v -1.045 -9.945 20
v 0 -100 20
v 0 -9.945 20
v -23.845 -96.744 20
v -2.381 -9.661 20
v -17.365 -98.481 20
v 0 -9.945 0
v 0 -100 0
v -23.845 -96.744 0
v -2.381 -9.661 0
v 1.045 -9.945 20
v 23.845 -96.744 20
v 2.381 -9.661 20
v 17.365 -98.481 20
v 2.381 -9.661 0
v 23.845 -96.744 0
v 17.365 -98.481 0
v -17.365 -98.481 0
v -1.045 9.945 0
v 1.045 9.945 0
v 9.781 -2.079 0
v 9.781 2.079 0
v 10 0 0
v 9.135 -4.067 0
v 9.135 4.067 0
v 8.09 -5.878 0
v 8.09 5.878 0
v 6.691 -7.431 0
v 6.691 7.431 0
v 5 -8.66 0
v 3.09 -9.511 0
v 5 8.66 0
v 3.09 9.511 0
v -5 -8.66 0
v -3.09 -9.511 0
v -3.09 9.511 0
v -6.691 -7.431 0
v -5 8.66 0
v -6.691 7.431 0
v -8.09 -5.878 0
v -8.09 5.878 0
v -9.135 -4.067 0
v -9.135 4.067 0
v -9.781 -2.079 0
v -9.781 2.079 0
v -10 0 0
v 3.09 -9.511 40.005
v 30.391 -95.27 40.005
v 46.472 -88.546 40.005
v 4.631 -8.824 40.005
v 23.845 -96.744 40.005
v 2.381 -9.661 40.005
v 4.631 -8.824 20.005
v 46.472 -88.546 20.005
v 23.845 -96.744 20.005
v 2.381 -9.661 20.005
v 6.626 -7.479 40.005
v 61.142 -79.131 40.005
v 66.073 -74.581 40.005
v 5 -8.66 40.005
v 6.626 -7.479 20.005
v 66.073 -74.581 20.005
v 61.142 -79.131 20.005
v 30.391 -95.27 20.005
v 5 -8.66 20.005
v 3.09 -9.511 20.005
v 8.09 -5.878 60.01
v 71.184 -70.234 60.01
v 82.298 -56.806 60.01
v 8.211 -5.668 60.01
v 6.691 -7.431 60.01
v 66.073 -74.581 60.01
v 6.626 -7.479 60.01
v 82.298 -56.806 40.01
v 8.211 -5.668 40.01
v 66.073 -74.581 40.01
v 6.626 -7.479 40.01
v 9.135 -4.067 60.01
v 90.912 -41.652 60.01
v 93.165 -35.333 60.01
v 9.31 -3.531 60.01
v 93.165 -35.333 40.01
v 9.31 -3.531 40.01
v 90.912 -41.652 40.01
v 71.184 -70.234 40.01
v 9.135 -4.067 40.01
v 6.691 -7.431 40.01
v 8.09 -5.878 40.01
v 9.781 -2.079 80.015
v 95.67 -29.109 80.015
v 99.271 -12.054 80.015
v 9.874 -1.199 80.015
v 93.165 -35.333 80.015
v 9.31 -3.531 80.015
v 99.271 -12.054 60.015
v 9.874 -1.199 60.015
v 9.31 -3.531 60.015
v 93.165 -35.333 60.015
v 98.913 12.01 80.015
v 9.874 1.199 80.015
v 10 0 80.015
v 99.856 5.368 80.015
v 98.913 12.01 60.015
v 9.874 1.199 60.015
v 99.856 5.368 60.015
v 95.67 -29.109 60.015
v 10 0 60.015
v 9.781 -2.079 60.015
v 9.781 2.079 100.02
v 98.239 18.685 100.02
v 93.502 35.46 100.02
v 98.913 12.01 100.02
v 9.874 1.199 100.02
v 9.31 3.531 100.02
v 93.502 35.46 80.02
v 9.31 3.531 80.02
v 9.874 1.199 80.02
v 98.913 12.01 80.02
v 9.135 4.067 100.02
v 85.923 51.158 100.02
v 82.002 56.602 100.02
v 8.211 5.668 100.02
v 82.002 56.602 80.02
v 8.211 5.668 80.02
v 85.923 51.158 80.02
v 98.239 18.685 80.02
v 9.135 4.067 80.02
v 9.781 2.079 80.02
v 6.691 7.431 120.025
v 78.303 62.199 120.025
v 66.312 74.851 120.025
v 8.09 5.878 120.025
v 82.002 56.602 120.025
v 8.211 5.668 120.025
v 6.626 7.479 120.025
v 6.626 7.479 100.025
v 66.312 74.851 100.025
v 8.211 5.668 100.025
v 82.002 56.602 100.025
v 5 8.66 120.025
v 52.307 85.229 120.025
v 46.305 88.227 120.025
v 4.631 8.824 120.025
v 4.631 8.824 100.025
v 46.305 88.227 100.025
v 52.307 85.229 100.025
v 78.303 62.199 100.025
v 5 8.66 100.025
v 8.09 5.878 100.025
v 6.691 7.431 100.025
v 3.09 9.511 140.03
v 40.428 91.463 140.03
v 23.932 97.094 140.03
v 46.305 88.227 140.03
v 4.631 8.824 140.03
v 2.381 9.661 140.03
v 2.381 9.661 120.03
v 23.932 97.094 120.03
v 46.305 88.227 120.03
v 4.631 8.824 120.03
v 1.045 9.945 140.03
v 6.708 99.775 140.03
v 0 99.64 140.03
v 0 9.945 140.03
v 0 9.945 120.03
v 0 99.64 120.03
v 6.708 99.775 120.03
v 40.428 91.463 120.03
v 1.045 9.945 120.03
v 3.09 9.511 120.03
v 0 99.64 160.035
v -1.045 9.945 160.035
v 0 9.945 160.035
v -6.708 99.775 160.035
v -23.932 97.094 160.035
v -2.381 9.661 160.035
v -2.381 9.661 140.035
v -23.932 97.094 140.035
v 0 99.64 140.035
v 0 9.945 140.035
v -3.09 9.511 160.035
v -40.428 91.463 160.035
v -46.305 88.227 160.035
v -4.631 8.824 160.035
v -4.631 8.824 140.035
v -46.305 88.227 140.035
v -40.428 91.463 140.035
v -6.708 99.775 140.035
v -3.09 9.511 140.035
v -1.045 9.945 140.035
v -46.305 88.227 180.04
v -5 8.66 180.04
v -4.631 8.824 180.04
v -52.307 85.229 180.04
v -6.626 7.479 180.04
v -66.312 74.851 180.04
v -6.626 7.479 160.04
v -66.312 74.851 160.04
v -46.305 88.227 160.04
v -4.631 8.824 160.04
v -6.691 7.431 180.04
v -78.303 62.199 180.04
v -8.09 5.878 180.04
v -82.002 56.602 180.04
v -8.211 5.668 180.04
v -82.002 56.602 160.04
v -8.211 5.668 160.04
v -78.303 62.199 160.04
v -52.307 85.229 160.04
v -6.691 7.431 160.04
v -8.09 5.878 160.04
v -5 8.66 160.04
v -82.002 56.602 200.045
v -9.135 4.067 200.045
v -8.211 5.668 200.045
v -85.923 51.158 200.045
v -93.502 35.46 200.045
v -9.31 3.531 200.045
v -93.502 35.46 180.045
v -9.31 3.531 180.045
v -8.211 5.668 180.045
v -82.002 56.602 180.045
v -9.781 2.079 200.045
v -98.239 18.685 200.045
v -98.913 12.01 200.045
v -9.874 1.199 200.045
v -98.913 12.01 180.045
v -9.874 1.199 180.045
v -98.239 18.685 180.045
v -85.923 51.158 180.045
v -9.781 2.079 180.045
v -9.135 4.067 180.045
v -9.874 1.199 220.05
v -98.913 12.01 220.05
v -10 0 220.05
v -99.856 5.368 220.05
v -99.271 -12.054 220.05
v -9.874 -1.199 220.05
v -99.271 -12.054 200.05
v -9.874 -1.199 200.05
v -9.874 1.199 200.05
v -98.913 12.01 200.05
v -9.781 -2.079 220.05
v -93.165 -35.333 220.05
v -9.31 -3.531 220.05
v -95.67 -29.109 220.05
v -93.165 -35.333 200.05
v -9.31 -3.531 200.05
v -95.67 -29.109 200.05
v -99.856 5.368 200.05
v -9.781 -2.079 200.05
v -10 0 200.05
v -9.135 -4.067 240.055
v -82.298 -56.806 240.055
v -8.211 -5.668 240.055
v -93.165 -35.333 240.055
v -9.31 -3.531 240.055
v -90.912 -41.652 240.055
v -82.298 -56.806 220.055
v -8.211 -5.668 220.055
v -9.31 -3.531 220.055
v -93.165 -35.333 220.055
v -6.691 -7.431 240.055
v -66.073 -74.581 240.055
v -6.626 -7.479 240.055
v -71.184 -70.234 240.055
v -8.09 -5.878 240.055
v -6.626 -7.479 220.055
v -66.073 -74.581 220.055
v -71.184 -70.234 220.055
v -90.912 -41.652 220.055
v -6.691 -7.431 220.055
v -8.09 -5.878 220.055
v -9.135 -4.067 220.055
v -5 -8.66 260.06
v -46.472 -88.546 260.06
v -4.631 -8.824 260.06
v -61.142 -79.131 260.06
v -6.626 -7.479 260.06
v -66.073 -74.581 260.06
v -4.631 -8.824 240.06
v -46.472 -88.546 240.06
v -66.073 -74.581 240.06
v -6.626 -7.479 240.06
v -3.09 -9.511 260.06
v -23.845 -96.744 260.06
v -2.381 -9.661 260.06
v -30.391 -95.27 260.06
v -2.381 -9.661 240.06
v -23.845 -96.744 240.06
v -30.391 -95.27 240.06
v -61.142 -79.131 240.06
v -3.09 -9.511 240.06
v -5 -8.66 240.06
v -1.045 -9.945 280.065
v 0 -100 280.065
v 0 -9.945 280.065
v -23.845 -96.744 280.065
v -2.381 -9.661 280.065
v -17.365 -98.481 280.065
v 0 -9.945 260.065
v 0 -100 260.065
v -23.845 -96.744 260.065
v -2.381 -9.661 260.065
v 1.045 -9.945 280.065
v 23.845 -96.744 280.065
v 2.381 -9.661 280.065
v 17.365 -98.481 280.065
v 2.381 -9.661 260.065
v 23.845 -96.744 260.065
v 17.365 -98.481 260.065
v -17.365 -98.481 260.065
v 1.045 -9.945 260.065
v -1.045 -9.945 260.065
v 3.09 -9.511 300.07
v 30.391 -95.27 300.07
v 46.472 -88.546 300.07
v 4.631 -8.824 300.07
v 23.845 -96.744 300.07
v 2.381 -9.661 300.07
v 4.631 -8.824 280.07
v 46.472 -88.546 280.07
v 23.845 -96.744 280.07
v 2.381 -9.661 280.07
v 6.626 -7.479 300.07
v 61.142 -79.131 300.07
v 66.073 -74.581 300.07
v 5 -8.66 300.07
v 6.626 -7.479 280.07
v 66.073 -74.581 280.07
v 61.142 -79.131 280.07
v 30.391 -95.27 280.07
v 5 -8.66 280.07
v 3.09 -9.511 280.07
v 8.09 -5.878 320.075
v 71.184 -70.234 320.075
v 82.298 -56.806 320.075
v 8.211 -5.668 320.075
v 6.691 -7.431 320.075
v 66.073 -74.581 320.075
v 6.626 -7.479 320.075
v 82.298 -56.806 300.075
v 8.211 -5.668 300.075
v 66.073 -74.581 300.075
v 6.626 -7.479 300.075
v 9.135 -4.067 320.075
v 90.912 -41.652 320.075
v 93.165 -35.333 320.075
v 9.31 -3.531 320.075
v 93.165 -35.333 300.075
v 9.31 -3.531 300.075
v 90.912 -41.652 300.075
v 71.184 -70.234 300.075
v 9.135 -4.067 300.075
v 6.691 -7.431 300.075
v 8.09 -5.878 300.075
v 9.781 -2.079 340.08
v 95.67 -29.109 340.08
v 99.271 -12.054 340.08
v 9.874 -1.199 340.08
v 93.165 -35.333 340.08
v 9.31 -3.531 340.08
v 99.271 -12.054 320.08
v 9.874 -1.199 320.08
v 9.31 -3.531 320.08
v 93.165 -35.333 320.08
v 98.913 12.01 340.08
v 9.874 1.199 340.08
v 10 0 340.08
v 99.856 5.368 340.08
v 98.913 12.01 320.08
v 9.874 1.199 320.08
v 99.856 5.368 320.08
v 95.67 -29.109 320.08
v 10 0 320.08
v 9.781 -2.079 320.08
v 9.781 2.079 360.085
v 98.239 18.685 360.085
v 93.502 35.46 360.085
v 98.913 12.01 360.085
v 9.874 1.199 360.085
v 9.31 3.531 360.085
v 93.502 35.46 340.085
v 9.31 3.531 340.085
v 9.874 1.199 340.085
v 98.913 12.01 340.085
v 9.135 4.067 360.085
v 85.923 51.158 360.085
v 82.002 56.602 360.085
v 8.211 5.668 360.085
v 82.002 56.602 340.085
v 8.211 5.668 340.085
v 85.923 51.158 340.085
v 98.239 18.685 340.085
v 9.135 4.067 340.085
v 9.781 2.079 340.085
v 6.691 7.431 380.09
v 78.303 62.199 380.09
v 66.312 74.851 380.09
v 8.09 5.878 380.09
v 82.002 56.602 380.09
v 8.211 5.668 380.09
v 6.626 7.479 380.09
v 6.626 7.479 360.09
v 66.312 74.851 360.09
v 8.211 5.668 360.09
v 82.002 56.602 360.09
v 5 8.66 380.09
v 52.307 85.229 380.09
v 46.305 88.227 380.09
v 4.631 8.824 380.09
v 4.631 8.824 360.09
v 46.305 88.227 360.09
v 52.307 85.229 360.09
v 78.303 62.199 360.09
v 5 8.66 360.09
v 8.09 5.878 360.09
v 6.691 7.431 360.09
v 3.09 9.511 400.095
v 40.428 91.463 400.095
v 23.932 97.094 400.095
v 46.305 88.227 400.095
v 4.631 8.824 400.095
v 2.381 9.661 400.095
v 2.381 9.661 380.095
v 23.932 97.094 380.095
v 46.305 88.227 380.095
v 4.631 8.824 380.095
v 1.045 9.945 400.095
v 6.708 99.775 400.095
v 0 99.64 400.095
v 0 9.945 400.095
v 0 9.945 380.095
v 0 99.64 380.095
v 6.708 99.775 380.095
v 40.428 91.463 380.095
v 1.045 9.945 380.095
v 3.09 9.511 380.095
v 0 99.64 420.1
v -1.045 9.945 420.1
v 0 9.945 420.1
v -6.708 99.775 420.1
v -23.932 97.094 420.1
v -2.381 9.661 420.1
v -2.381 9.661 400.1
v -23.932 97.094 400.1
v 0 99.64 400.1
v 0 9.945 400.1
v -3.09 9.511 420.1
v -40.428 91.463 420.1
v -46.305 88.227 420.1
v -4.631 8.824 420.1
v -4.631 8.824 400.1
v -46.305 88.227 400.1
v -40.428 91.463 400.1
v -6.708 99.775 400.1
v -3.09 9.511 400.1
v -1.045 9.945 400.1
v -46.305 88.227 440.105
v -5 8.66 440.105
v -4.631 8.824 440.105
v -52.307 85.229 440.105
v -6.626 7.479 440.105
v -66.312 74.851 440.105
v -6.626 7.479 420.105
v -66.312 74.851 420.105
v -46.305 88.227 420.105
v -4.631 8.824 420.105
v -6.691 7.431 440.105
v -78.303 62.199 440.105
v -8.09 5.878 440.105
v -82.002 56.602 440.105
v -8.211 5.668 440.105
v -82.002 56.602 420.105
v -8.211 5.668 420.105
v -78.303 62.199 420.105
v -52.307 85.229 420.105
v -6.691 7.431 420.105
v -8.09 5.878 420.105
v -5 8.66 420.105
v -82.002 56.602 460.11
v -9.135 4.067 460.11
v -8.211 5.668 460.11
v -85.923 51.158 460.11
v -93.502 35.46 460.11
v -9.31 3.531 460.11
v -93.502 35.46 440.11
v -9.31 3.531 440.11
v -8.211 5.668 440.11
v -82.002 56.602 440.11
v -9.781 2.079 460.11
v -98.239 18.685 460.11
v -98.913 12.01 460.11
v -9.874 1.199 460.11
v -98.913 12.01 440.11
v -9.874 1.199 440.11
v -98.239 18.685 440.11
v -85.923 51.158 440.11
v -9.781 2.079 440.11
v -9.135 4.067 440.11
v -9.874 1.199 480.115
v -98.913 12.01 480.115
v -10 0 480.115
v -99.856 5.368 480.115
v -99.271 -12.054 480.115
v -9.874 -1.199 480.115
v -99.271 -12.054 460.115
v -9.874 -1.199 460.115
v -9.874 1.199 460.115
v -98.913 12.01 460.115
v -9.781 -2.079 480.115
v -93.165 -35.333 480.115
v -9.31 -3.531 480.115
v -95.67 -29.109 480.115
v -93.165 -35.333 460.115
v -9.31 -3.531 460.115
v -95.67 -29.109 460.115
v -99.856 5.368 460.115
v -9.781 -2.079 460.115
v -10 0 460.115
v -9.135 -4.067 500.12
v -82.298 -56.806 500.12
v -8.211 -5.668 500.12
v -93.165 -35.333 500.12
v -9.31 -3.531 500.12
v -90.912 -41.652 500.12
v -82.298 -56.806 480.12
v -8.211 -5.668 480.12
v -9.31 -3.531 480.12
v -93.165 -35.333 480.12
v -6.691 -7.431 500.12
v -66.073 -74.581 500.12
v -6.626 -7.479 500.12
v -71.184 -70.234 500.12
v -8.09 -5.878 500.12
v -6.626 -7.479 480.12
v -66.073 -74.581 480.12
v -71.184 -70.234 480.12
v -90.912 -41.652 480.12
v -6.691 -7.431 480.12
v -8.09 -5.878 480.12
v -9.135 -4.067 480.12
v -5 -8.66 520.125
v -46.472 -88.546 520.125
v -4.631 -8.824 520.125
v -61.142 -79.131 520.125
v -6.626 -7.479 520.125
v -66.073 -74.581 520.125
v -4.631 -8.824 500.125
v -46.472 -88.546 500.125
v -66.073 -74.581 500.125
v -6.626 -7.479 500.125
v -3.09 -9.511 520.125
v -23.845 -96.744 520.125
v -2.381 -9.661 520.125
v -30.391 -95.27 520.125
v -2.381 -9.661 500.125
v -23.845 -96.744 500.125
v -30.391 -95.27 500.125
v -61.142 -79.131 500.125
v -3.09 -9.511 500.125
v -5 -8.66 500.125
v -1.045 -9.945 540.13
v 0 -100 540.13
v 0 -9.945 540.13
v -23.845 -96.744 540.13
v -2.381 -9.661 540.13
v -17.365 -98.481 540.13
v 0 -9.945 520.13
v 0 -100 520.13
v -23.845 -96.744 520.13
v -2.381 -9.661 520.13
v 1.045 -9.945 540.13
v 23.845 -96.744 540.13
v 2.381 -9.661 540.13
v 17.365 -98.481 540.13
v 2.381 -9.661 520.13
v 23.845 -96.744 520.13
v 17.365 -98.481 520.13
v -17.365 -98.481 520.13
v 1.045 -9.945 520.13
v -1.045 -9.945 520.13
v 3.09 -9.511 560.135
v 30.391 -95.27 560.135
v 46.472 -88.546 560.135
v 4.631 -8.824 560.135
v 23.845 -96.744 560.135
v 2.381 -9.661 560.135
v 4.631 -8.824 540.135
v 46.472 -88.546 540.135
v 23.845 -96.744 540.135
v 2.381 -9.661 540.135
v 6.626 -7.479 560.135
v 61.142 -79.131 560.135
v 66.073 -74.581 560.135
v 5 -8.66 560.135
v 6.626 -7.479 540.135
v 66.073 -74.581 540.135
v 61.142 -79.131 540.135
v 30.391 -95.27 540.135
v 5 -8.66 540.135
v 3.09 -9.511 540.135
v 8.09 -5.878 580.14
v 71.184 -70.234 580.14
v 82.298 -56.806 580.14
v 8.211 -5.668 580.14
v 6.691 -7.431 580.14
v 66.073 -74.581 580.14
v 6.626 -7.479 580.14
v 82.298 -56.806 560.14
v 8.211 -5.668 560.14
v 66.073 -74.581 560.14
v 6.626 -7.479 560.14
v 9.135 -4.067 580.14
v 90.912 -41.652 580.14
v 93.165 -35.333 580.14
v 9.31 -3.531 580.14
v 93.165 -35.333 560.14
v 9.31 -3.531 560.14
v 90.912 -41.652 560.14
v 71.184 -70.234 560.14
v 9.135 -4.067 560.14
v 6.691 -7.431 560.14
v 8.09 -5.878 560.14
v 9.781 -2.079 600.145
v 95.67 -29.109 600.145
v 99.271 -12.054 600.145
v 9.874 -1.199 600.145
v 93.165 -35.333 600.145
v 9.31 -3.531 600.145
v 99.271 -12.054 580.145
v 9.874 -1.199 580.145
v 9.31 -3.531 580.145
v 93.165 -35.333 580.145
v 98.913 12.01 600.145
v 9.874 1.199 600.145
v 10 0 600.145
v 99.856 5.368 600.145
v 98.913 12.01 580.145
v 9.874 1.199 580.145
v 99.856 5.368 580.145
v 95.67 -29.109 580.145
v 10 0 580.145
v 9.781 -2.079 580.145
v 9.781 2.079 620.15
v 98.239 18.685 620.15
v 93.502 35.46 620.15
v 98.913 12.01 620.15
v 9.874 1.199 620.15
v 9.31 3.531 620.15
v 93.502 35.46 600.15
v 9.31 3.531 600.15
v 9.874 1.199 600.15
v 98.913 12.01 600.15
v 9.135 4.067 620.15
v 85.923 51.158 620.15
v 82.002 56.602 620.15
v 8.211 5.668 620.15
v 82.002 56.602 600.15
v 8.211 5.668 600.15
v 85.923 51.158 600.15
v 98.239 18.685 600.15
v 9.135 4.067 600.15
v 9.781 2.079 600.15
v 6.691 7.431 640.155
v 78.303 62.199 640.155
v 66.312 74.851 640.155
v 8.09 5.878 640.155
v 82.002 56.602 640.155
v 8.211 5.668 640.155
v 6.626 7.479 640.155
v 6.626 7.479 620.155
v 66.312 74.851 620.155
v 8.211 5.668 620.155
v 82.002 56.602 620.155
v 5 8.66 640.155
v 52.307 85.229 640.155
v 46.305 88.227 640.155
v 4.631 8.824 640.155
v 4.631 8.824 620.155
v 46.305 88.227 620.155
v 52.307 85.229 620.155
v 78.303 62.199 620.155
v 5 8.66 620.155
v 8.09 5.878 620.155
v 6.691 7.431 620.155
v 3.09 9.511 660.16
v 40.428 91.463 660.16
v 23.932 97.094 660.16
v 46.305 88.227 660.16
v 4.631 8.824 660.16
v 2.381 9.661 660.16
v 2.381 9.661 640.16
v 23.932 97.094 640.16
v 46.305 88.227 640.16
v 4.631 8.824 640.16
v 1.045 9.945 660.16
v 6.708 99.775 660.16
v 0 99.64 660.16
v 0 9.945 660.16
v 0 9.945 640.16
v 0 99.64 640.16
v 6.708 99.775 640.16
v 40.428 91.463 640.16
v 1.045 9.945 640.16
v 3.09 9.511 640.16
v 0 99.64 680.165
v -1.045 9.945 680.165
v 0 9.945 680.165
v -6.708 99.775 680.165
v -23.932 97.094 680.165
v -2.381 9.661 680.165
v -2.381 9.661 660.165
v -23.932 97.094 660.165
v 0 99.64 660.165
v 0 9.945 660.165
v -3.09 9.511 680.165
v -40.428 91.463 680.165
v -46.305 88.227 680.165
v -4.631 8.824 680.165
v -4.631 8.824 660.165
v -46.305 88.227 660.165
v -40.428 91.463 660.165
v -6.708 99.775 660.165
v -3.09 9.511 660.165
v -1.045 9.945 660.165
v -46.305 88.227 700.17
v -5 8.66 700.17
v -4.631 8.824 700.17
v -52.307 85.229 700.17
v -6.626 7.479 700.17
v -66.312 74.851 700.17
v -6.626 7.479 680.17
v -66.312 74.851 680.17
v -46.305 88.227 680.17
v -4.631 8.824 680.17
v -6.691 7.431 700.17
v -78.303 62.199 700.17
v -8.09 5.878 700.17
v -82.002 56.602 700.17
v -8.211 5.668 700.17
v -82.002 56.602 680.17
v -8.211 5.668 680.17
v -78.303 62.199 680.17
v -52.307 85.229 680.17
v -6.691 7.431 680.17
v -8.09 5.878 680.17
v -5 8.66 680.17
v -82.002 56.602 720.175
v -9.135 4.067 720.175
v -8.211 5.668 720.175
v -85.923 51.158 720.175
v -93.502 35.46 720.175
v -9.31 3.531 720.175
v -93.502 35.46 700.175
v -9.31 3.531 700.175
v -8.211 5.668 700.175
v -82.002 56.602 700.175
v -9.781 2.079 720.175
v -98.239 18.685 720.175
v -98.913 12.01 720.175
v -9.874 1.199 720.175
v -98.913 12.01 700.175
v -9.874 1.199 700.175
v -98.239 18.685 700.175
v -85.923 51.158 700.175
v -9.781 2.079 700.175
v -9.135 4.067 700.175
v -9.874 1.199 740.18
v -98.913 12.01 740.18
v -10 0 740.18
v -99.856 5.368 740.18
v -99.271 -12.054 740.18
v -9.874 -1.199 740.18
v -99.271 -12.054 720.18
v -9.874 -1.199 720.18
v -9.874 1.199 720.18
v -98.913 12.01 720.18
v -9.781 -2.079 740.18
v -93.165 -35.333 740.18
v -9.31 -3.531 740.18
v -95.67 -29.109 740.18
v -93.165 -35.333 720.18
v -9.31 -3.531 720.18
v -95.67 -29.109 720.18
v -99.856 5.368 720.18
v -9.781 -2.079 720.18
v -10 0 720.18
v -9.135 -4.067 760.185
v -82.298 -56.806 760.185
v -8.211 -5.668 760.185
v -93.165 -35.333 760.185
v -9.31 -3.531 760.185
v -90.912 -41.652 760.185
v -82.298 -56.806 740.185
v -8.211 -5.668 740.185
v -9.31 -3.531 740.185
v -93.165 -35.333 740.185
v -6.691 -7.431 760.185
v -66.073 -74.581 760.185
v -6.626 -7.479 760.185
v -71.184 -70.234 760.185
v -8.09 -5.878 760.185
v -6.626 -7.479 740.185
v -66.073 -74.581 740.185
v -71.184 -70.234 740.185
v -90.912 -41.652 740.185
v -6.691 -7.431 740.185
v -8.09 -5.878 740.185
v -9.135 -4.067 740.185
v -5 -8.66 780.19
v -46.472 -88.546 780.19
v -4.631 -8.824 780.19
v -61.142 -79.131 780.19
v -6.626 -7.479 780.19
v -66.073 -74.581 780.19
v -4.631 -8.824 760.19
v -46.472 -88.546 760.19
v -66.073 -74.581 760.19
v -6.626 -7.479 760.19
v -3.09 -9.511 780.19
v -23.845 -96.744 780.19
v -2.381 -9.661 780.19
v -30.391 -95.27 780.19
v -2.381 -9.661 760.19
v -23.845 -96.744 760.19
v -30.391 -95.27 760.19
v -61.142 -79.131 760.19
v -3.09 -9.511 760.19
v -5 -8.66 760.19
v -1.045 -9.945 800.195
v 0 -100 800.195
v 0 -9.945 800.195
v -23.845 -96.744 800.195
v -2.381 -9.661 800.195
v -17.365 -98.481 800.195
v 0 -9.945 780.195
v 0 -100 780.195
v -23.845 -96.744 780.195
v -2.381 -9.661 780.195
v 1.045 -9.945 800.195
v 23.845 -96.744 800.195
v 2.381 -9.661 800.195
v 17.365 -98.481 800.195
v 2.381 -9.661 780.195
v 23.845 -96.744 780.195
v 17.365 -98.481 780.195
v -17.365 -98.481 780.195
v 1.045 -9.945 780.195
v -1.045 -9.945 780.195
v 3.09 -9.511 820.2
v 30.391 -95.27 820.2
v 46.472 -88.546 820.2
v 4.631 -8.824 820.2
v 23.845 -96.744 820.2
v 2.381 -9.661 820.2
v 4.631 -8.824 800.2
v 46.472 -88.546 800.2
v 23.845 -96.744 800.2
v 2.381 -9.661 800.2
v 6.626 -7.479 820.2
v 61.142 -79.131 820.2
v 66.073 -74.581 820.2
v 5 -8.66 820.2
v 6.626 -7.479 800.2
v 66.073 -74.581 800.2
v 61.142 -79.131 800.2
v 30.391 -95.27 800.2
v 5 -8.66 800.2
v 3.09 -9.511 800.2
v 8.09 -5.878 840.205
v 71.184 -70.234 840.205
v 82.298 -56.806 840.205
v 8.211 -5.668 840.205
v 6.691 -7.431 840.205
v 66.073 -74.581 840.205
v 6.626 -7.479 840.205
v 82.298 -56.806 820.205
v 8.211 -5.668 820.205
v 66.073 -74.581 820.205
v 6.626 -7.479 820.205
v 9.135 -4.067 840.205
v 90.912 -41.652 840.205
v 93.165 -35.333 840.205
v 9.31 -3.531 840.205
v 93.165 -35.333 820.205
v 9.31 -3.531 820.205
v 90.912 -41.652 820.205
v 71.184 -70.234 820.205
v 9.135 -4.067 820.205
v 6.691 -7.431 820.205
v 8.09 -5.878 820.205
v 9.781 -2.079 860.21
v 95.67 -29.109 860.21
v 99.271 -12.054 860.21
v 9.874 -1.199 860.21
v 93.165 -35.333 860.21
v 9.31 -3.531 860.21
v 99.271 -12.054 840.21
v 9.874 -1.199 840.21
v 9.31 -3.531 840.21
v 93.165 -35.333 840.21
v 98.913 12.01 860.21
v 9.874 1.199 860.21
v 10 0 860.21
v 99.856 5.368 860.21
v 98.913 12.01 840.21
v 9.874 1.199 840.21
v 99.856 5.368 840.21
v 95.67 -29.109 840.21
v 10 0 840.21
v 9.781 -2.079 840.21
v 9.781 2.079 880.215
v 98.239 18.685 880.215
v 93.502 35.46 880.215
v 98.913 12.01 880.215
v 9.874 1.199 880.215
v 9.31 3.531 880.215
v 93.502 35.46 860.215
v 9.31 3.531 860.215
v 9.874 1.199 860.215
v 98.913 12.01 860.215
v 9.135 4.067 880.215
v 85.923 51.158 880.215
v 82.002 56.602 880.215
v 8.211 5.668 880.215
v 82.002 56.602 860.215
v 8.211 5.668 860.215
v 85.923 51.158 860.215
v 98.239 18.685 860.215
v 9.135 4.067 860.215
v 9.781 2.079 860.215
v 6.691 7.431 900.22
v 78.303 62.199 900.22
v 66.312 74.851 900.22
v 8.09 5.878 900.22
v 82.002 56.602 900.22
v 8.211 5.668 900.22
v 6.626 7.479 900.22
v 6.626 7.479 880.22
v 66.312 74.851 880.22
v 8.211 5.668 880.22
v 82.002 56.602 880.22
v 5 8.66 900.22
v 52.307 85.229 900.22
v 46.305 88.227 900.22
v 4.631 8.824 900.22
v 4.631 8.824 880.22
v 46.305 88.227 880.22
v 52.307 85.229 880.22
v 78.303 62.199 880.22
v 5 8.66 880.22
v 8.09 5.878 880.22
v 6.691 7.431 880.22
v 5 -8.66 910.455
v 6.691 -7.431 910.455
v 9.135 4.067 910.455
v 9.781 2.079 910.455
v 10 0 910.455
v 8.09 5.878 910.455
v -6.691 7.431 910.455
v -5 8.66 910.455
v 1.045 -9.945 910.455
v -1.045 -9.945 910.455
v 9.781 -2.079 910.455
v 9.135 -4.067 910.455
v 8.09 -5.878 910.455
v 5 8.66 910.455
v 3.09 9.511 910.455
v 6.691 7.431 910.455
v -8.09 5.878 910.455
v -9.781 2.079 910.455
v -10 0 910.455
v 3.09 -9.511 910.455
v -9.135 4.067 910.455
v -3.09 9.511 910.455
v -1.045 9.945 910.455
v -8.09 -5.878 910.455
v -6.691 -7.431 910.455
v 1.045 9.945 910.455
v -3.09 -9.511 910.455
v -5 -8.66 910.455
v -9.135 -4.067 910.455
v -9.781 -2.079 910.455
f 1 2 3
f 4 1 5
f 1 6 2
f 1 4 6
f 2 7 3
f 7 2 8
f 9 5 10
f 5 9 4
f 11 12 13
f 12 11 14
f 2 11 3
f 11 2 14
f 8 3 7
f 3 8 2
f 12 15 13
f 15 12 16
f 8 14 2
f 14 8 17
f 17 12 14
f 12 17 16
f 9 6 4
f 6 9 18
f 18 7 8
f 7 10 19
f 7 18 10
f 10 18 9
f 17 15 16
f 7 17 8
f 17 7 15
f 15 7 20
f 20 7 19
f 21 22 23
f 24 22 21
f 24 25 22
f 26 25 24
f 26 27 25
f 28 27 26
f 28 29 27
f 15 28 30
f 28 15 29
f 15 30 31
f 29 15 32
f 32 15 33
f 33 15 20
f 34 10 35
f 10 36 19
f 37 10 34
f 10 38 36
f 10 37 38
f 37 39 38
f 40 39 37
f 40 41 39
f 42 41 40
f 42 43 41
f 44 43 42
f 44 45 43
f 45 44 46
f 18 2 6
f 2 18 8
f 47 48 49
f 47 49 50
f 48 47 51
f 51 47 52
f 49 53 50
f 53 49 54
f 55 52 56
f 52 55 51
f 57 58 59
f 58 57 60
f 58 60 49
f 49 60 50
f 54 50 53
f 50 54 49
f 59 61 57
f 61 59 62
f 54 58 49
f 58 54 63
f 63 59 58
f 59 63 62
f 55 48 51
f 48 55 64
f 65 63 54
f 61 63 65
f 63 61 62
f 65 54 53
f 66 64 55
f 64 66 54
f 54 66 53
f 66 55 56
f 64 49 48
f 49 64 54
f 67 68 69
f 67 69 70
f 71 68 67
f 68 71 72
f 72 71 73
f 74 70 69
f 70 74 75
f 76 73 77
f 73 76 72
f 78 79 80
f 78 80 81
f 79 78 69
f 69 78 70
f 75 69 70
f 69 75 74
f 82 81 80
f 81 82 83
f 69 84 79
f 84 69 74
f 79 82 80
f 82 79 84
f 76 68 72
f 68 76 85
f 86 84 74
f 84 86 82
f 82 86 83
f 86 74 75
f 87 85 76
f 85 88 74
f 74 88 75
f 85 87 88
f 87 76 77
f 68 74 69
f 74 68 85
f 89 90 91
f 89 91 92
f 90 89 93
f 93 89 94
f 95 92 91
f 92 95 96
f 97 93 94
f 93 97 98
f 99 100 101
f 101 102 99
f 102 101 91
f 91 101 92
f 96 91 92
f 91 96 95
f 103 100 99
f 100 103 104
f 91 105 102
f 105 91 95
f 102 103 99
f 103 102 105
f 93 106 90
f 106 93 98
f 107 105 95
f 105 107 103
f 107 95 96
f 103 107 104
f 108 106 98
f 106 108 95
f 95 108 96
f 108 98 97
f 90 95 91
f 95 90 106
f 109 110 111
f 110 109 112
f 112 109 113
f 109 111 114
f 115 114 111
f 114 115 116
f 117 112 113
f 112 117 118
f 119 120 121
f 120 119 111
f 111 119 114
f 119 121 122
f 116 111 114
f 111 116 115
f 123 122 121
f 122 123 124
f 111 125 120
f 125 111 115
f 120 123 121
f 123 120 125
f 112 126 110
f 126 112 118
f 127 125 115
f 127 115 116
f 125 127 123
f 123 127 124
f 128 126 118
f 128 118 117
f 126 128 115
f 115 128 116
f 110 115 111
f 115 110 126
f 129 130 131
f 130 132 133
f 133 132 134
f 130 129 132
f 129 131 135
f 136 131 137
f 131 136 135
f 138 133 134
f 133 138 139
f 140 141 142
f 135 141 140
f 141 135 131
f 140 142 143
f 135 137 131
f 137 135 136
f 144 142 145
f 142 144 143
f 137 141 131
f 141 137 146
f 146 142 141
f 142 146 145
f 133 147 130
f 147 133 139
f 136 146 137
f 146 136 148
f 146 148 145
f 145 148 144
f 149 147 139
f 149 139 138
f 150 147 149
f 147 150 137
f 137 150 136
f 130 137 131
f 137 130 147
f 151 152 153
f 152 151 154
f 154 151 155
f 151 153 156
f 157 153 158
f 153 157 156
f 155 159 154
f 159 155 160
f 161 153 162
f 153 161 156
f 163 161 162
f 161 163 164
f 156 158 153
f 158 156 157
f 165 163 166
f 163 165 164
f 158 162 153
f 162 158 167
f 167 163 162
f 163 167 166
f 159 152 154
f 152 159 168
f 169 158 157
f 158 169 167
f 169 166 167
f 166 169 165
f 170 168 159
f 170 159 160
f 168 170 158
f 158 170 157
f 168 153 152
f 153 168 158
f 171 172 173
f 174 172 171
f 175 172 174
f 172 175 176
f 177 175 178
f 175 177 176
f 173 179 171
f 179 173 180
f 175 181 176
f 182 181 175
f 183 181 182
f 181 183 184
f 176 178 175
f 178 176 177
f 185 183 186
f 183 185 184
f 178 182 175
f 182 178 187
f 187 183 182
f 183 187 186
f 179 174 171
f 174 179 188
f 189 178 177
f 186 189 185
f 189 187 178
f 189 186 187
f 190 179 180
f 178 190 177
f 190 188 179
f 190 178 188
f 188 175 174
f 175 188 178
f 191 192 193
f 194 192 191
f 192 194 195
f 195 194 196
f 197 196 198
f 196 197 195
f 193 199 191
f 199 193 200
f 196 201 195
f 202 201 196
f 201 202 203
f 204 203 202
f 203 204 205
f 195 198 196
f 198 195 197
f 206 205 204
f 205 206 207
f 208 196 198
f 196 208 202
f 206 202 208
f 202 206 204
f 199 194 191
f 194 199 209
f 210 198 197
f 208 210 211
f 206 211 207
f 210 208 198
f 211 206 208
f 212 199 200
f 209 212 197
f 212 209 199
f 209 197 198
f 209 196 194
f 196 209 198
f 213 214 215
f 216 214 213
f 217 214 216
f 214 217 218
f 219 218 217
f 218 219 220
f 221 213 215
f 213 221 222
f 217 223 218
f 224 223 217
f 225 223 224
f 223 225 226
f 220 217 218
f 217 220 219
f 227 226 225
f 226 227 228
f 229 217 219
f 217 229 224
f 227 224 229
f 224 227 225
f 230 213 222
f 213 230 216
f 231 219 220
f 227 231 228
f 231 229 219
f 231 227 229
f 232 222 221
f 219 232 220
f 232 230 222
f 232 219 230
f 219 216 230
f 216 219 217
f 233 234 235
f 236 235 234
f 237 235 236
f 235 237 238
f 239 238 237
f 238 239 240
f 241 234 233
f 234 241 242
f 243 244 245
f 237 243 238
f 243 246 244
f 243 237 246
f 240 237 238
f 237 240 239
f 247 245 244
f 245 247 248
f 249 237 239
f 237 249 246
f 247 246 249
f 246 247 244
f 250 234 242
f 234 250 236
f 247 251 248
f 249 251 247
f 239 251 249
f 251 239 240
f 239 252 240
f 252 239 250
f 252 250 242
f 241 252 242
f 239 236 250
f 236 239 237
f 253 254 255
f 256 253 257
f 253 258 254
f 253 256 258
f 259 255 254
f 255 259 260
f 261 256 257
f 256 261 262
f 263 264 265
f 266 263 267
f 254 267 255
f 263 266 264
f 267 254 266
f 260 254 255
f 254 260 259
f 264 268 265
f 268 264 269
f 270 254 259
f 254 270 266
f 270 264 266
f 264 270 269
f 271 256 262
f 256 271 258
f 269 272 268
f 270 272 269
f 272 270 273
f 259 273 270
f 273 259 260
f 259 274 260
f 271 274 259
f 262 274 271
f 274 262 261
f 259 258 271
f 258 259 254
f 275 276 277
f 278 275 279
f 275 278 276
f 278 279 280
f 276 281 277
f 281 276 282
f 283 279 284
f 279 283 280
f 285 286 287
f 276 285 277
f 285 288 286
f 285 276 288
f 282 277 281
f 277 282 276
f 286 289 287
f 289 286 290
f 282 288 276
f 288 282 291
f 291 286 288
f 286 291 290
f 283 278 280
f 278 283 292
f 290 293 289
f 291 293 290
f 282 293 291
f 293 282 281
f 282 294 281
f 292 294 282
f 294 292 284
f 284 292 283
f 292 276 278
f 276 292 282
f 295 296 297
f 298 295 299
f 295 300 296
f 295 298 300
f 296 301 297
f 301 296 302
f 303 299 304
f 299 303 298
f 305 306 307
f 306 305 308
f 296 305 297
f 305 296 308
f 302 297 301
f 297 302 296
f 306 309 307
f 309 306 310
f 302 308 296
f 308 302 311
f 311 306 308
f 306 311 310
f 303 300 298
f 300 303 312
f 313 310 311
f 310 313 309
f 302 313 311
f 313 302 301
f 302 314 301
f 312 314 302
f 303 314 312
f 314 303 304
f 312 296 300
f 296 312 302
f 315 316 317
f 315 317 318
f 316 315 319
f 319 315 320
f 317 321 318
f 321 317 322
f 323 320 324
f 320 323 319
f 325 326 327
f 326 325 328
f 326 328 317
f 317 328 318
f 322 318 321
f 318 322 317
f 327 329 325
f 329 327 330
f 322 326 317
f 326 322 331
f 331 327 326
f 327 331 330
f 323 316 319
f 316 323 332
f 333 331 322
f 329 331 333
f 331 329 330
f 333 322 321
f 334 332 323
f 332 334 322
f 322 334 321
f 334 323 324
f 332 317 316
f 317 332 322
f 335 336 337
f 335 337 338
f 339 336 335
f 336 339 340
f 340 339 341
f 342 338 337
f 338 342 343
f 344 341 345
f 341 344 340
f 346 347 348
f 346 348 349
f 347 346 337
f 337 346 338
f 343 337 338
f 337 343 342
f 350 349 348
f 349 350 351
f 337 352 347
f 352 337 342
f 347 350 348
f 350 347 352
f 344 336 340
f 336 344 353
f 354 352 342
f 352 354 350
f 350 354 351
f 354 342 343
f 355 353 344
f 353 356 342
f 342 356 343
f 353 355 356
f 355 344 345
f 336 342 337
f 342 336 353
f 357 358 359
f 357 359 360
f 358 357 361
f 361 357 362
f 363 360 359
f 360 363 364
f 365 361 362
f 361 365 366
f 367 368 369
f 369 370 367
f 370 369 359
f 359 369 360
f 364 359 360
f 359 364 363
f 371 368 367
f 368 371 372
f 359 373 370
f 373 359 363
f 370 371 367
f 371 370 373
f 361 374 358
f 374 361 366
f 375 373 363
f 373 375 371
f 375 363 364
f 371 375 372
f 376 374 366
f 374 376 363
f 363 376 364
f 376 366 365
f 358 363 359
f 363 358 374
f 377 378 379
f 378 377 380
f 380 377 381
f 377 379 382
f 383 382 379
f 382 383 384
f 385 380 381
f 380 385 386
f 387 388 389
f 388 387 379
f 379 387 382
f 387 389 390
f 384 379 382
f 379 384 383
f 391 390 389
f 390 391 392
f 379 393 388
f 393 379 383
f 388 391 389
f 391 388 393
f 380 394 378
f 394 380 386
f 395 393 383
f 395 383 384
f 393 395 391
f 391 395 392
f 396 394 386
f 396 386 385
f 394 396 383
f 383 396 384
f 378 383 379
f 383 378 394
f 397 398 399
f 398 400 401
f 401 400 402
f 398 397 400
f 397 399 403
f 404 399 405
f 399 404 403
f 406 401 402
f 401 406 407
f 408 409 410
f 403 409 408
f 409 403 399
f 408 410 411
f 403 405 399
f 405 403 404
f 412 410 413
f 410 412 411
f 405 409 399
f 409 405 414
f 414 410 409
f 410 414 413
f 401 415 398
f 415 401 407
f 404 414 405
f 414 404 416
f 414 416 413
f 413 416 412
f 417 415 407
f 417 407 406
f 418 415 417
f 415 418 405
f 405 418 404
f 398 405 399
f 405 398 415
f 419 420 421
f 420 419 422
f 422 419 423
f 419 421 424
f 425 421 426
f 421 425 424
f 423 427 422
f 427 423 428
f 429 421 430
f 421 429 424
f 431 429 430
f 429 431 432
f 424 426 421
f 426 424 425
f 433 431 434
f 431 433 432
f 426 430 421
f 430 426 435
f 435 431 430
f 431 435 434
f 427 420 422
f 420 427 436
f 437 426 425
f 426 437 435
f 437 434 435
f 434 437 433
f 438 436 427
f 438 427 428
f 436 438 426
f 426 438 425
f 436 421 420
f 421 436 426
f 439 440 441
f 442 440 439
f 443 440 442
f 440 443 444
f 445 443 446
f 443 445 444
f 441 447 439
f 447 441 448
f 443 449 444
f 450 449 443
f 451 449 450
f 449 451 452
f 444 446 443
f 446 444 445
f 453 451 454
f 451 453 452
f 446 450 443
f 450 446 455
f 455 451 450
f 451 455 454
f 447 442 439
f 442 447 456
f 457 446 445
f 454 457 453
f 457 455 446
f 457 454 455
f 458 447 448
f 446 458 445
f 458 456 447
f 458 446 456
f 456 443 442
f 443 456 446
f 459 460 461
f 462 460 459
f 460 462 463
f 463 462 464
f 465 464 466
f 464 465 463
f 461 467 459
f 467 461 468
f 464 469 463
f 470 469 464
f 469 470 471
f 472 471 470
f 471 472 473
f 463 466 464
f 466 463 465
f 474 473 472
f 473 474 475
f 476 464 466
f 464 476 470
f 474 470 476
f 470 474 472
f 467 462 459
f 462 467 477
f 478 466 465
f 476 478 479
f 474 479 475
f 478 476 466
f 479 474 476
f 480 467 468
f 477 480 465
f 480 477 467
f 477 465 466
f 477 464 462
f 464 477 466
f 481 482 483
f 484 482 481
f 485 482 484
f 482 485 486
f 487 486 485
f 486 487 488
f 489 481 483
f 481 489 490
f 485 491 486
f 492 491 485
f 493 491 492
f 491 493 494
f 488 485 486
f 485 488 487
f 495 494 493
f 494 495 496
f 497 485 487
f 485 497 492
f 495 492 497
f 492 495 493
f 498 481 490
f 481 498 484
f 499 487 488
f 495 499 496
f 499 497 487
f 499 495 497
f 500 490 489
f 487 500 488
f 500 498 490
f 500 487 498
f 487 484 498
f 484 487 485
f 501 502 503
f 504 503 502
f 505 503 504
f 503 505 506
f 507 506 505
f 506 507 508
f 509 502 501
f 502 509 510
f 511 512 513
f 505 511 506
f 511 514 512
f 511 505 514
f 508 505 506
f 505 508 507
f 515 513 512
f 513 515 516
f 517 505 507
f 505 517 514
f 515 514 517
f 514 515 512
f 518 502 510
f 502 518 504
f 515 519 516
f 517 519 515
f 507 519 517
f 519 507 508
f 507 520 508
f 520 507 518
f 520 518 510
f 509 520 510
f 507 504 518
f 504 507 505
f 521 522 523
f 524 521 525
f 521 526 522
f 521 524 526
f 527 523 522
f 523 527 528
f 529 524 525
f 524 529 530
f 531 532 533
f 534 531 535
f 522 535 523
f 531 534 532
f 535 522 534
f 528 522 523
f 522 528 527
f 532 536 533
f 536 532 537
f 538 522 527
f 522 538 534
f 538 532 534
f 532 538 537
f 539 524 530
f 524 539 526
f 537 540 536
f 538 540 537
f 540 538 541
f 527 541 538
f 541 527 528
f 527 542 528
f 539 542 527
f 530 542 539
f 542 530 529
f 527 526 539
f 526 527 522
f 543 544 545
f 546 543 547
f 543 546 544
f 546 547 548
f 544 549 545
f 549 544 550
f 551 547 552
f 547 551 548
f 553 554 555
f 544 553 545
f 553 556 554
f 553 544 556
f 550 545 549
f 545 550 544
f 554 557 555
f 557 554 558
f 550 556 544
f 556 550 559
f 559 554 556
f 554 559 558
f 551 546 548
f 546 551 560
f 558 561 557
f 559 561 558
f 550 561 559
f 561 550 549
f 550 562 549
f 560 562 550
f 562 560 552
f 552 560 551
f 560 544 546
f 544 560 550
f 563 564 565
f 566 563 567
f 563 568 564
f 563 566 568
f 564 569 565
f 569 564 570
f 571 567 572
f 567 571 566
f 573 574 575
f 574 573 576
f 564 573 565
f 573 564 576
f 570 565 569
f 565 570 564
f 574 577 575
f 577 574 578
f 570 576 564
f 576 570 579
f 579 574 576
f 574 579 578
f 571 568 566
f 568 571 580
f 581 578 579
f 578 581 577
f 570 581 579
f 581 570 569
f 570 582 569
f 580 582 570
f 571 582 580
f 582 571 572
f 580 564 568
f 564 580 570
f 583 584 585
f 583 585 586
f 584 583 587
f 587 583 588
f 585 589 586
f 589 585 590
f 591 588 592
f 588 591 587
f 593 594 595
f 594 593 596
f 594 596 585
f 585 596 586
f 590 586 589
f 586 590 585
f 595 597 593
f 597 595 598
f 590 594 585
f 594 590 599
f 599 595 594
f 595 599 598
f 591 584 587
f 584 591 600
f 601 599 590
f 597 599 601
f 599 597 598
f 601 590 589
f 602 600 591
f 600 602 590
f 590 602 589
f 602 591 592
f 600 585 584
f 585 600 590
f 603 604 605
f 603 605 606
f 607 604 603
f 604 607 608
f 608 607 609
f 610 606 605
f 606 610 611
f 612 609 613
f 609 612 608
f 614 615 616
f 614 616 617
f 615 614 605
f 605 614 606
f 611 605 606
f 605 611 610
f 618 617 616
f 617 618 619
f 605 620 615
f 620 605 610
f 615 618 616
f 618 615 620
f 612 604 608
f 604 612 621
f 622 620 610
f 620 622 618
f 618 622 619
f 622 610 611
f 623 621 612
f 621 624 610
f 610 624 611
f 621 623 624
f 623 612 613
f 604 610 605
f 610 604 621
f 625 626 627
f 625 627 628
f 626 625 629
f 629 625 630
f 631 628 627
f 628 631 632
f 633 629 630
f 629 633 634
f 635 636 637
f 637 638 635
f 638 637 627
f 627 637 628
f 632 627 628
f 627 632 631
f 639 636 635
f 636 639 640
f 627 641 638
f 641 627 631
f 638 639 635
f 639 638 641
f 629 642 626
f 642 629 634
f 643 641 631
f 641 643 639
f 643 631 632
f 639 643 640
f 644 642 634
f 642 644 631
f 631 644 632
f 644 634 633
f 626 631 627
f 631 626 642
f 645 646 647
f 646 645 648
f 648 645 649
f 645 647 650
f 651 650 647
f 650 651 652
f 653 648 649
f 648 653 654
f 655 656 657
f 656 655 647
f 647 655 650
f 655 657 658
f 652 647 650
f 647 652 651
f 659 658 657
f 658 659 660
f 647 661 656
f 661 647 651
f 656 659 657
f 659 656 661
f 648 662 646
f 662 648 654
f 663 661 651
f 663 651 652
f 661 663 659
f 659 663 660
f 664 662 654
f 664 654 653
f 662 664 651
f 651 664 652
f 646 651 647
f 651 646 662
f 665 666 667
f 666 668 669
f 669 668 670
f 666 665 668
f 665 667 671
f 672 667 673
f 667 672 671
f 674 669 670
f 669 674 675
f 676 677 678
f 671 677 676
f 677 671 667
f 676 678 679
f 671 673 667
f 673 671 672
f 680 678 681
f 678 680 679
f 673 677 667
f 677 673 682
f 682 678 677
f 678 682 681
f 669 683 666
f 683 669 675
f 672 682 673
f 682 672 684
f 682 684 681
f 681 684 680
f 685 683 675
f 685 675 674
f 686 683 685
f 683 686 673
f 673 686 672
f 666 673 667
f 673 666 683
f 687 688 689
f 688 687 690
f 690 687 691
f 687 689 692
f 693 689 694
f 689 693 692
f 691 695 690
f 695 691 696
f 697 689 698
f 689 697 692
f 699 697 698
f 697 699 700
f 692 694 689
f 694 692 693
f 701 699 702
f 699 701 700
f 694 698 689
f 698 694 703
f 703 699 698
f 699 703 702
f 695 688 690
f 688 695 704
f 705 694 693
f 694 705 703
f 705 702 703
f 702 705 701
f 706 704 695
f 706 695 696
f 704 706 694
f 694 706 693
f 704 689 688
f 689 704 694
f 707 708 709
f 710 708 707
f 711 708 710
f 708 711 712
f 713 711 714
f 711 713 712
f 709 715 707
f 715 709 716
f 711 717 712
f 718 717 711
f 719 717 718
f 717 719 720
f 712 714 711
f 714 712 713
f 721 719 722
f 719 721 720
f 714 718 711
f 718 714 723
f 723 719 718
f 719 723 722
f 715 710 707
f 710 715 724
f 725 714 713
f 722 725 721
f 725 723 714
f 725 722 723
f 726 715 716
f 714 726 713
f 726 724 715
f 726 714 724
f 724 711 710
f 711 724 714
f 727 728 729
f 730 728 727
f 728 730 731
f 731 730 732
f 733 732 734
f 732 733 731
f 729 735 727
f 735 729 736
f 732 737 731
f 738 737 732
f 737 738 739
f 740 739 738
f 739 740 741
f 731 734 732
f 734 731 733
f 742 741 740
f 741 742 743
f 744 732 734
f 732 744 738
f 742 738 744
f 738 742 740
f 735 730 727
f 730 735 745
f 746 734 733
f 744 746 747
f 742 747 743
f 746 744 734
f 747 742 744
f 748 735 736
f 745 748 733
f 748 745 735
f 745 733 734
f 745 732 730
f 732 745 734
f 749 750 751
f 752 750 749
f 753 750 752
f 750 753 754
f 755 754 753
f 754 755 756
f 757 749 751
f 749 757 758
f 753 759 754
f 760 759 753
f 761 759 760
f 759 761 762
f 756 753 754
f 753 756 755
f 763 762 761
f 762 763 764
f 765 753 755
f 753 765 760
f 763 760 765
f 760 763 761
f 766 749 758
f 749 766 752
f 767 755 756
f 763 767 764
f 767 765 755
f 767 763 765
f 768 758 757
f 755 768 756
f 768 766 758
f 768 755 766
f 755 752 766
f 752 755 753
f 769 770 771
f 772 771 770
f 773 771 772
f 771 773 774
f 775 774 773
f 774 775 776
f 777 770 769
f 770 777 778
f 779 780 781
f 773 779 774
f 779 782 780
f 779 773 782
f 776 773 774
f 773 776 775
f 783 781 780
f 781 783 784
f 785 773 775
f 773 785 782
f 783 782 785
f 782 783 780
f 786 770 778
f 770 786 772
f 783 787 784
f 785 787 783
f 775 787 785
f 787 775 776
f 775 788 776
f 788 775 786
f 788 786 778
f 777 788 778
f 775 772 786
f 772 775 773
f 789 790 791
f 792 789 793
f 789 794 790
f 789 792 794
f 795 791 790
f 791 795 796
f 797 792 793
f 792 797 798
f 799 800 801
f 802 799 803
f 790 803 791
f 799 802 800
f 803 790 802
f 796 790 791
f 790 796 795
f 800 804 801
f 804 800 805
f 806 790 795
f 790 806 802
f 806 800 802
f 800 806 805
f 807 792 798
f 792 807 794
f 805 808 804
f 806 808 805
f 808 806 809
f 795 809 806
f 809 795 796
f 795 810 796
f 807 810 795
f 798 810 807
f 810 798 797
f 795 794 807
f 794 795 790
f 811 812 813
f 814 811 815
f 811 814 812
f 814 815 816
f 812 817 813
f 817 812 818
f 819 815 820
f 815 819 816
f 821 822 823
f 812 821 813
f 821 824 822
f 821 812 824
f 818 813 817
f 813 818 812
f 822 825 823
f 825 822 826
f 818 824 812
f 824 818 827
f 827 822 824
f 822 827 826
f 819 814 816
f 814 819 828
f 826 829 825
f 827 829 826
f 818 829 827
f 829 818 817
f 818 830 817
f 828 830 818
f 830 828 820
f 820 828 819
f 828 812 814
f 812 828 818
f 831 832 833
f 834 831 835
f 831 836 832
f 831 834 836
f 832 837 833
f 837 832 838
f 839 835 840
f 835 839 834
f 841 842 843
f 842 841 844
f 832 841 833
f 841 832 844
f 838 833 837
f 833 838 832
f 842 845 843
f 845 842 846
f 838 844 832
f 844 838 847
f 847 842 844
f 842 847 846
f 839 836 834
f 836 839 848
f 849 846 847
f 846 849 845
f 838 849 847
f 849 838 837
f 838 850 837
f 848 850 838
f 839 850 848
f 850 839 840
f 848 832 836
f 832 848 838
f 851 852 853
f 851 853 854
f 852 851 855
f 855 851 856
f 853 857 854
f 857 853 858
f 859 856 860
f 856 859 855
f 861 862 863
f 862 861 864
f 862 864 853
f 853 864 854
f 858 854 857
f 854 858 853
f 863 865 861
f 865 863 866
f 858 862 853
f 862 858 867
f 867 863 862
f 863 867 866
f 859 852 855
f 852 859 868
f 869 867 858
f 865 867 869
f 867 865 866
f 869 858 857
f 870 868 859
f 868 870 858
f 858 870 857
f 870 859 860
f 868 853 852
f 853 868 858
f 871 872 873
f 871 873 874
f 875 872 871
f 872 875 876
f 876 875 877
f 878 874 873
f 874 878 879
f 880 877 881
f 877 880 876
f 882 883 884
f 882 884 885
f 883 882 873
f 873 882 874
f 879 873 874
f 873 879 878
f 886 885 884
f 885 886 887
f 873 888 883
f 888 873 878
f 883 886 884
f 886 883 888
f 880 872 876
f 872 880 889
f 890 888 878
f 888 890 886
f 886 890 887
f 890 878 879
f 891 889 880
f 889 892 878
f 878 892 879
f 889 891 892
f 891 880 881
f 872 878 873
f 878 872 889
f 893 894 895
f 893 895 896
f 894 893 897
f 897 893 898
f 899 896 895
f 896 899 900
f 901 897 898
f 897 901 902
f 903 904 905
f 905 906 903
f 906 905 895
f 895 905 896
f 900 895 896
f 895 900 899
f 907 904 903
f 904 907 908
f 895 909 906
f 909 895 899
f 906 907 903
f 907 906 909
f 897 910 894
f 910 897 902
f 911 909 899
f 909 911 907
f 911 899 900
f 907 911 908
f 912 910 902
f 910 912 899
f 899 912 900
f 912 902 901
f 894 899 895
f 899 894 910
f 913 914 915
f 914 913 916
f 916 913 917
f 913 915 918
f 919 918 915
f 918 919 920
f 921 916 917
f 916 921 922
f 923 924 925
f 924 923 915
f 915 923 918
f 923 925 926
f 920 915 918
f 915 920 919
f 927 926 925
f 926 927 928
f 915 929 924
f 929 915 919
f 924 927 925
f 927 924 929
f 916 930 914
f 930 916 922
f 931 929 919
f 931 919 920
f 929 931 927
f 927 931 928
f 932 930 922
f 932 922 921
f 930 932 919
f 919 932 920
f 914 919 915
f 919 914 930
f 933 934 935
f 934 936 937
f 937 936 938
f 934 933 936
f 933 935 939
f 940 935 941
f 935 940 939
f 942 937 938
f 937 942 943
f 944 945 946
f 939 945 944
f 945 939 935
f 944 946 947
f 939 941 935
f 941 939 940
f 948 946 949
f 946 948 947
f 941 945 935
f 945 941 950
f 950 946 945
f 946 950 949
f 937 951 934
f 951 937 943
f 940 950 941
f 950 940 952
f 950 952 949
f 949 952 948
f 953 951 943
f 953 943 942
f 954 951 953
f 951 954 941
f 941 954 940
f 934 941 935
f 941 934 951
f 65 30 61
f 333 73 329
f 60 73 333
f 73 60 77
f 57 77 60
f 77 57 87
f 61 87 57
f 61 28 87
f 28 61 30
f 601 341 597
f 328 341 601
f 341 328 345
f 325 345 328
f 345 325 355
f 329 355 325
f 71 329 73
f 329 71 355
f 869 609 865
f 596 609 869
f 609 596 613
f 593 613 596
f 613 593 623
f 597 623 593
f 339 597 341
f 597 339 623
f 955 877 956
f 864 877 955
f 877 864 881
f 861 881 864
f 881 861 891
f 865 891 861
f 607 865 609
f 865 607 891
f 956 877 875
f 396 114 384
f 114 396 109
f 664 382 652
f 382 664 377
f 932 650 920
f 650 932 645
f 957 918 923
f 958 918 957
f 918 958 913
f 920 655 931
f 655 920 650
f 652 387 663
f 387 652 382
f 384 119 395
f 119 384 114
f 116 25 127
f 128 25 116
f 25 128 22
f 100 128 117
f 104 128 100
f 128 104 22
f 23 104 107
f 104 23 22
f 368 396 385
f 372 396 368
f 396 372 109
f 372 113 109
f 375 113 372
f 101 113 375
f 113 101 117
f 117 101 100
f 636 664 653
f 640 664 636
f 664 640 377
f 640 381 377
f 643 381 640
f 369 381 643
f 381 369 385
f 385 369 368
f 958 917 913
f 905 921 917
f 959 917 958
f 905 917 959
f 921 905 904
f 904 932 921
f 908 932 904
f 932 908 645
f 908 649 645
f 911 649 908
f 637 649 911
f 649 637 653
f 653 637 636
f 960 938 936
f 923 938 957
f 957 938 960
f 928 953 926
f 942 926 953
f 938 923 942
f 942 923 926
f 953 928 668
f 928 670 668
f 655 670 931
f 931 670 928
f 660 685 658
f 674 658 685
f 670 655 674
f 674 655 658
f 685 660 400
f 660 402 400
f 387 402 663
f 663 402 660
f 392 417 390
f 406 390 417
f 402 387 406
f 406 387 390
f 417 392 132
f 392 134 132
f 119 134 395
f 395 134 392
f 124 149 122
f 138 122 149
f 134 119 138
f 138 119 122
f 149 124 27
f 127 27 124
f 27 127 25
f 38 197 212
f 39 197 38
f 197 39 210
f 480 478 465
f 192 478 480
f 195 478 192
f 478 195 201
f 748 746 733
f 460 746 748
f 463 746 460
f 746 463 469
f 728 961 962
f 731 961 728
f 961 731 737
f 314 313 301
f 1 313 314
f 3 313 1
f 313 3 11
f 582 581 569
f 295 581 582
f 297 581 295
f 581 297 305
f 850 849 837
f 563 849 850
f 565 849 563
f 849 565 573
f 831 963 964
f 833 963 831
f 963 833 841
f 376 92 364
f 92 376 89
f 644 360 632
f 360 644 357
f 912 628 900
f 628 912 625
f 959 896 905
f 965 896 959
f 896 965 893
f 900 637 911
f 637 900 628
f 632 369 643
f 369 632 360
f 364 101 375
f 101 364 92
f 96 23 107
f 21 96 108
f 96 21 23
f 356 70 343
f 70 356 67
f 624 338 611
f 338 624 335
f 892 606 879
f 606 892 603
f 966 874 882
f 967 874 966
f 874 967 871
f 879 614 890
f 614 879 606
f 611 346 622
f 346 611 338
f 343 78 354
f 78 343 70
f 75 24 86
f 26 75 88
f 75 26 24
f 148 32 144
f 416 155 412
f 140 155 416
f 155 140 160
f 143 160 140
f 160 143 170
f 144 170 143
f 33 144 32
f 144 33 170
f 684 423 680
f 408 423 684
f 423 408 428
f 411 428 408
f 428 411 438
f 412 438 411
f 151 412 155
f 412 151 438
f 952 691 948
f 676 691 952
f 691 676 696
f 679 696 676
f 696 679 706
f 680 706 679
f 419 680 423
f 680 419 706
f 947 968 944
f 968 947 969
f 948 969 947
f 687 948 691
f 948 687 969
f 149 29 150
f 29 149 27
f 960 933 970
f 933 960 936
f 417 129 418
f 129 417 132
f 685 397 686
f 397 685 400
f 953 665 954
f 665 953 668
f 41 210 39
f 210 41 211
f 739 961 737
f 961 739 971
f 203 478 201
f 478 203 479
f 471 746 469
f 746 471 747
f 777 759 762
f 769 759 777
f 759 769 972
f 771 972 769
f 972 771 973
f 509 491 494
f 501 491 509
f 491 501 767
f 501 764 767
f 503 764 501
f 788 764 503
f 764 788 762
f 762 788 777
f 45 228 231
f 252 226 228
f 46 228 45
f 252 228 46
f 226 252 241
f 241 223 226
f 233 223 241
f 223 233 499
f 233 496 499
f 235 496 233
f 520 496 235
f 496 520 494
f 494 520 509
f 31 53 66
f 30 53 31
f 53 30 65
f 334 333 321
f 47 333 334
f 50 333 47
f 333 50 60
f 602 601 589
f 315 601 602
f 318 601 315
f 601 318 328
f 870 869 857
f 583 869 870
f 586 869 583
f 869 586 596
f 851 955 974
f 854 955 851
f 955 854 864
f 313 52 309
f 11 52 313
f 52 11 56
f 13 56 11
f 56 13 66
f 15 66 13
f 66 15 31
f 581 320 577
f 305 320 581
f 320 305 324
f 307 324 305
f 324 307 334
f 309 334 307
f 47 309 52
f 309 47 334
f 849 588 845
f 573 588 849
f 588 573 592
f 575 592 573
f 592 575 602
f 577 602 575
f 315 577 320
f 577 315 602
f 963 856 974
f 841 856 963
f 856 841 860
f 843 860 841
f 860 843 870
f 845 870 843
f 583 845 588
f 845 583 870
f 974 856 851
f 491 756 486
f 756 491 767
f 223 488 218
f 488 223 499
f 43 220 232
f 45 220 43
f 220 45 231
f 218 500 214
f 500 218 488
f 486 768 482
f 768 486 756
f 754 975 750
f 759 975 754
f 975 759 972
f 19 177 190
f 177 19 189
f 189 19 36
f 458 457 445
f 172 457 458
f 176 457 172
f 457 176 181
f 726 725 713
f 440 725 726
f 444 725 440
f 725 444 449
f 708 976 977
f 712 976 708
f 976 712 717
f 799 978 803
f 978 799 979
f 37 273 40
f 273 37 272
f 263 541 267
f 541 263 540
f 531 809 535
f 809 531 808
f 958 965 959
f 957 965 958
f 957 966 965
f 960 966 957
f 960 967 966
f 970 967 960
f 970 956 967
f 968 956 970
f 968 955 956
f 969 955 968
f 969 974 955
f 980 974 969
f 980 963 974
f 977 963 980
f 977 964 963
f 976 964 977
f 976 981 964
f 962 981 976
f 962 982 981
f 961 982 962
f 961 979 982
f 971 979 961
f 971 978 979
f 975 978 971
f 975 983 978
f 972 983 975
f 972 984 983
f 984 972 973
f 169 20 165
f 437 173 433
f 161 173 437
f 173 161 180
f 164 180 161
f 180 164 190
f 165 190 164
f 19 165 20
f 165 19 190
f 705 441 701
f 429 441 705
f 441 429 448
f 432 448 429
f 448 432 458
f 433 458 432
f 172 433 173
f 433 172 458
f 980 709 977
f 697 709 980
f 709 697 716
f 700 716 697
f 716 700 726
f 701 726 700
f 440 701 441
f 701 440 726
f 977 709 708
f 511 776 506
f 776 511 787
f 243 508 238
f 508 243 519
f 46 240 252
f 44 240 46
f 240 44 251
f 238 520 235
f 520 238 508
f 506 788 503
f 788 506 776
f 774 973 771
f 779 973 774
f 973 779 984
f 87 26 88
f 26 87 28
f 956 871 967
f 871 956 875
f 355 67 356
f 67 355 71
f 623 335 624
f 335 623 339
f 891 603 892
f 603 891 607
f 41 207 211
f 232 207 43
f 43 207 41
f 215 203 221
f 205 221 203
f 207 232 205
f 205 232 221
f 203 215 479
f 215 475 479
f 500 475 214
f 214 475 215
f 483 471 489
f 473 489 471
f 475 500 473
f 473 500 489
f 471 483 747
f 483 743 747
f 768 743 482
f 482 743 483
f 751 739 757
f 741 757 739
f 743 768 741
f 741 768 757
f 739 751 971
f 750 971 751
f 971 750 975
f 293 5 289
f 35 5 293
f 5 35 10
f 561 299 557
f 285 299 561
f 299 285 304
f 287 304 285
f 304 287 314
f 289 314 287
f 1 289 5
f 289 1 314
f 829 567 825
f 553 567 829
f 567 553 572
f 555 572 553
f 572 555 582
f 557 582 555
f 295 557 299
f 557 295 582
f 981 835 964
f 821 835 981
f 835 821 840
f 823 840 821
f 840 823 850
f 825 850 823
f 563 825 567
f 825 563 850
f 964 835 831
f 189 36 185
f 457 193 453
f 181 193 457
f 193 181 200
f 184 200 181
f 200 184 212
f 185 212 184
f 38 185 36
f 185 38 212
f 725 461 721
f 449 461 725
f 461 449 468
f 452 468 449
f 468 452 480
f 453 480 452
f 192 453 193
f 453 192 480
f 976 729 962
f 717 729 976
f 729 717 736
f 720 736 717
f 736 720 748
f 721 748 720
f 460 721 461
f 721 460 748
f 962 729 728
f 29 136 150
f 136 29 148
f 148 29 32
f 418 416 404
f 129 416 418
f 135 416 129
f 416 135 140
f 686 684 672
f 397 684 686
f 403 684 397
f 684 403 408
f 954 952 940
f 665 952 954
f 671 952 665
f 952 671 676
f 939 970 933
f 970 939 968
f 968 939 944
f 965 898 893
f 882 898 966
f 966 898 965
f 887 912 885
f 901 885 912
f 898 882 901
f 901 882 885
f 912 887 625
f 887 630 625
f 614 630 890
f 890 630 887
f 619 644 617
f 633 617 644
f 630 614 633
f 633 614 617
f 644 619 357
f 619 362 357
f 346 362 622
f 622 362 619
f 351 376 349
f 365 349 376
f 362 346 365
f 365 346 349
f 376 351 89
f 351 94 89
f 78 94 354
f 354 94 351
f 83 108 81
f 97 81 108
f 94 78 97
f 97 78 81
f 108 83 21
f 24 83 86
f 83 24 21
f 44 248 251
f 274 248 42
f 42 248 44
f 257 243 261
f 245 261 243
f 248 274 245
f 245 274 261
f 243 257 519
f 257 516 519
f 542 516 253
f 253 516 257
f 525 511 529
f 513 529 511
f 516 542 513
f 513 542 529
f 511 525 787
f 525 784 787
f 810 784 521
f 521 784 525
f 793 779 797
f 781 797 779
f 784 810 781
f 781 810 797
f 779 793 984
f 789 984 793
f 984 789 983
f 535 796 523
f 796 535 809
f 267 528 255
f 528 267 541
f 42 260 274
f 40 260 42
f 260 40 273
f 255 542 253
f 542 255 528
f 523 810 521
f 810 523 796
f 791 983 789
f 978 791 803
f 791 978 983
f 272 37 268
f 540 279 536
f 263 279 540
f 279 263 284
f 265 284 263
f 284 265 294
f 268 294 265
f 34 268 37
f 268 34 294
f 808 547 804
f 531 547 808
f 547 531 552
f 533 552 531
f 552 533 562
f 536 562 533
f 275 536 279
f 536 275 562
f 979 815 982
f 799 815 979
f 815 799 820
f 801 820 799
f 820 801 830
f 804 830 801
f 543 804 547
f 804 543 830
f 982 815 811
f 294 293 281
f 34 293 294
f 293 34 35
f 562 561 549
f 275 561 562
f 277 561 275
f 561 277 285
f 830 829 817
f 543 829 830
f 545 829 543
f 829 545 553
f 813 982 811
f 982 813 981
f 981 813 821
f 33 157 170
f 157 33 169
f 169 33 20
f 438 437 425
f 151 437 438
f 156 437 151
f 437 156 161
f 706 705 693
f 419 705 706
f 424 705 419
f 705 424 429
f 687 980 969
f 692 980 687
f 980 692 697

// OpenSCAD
/*
  Spiral Staircase
*/

/* [Step Settings] */
//total revolutions
revolutions = 3.5;
//radius
radius = 100;
//segments per turn
segments = 13;
//height of segments
height = 40;
//central column radius
column = 10;


module triangle(y = 100, angle = 60, h = 10) {
  x = y*tan(angle/2);

  for (i = [-1, 1]) {
    translate([i*x/2, -y/2, 0])
    mirror([1-i, 0, 0])
    difference() {
      cube([x, y, h], center = true);
      rotate([0, 0, angle/2])
        translate([x/2, 0, 0])
        cube([x, 2*y, h*1.01], center = true);
    }
  }
}

module step(h = 10, r = 100, segments = 6, clr = "gray") {

  $fn = 36;
  angle = 360/segments;
  
  intersection() {
    color(clr)
    cylinder(r = r, h = h);
    color(clr)
    triangle(y = r, angle = angle, h = h);
  }
  
}

module spiral(rev = 4, r = 100, h = 40, segments = 12, column = 10) {
  colors = ["red", "orange", "yellow", "green", "blue", "indigo", "violet"];
  angle = 360/segments;
  total = rev * segments;
  for(i = [0:total-1]) {
    rotate([0, 0, angle*i])
      translate([0, 0, (h+.01)/2*i])
      step(h = h, r = r, segments = segments, clr = colors[i%7]);
  }
  color("silver")
    cylinder(r = column, h = rev*h*segments/2 + (.01 * total));
}
spiral(rev = revolutions, r = radius, h = height, segments = segments, column = column);
